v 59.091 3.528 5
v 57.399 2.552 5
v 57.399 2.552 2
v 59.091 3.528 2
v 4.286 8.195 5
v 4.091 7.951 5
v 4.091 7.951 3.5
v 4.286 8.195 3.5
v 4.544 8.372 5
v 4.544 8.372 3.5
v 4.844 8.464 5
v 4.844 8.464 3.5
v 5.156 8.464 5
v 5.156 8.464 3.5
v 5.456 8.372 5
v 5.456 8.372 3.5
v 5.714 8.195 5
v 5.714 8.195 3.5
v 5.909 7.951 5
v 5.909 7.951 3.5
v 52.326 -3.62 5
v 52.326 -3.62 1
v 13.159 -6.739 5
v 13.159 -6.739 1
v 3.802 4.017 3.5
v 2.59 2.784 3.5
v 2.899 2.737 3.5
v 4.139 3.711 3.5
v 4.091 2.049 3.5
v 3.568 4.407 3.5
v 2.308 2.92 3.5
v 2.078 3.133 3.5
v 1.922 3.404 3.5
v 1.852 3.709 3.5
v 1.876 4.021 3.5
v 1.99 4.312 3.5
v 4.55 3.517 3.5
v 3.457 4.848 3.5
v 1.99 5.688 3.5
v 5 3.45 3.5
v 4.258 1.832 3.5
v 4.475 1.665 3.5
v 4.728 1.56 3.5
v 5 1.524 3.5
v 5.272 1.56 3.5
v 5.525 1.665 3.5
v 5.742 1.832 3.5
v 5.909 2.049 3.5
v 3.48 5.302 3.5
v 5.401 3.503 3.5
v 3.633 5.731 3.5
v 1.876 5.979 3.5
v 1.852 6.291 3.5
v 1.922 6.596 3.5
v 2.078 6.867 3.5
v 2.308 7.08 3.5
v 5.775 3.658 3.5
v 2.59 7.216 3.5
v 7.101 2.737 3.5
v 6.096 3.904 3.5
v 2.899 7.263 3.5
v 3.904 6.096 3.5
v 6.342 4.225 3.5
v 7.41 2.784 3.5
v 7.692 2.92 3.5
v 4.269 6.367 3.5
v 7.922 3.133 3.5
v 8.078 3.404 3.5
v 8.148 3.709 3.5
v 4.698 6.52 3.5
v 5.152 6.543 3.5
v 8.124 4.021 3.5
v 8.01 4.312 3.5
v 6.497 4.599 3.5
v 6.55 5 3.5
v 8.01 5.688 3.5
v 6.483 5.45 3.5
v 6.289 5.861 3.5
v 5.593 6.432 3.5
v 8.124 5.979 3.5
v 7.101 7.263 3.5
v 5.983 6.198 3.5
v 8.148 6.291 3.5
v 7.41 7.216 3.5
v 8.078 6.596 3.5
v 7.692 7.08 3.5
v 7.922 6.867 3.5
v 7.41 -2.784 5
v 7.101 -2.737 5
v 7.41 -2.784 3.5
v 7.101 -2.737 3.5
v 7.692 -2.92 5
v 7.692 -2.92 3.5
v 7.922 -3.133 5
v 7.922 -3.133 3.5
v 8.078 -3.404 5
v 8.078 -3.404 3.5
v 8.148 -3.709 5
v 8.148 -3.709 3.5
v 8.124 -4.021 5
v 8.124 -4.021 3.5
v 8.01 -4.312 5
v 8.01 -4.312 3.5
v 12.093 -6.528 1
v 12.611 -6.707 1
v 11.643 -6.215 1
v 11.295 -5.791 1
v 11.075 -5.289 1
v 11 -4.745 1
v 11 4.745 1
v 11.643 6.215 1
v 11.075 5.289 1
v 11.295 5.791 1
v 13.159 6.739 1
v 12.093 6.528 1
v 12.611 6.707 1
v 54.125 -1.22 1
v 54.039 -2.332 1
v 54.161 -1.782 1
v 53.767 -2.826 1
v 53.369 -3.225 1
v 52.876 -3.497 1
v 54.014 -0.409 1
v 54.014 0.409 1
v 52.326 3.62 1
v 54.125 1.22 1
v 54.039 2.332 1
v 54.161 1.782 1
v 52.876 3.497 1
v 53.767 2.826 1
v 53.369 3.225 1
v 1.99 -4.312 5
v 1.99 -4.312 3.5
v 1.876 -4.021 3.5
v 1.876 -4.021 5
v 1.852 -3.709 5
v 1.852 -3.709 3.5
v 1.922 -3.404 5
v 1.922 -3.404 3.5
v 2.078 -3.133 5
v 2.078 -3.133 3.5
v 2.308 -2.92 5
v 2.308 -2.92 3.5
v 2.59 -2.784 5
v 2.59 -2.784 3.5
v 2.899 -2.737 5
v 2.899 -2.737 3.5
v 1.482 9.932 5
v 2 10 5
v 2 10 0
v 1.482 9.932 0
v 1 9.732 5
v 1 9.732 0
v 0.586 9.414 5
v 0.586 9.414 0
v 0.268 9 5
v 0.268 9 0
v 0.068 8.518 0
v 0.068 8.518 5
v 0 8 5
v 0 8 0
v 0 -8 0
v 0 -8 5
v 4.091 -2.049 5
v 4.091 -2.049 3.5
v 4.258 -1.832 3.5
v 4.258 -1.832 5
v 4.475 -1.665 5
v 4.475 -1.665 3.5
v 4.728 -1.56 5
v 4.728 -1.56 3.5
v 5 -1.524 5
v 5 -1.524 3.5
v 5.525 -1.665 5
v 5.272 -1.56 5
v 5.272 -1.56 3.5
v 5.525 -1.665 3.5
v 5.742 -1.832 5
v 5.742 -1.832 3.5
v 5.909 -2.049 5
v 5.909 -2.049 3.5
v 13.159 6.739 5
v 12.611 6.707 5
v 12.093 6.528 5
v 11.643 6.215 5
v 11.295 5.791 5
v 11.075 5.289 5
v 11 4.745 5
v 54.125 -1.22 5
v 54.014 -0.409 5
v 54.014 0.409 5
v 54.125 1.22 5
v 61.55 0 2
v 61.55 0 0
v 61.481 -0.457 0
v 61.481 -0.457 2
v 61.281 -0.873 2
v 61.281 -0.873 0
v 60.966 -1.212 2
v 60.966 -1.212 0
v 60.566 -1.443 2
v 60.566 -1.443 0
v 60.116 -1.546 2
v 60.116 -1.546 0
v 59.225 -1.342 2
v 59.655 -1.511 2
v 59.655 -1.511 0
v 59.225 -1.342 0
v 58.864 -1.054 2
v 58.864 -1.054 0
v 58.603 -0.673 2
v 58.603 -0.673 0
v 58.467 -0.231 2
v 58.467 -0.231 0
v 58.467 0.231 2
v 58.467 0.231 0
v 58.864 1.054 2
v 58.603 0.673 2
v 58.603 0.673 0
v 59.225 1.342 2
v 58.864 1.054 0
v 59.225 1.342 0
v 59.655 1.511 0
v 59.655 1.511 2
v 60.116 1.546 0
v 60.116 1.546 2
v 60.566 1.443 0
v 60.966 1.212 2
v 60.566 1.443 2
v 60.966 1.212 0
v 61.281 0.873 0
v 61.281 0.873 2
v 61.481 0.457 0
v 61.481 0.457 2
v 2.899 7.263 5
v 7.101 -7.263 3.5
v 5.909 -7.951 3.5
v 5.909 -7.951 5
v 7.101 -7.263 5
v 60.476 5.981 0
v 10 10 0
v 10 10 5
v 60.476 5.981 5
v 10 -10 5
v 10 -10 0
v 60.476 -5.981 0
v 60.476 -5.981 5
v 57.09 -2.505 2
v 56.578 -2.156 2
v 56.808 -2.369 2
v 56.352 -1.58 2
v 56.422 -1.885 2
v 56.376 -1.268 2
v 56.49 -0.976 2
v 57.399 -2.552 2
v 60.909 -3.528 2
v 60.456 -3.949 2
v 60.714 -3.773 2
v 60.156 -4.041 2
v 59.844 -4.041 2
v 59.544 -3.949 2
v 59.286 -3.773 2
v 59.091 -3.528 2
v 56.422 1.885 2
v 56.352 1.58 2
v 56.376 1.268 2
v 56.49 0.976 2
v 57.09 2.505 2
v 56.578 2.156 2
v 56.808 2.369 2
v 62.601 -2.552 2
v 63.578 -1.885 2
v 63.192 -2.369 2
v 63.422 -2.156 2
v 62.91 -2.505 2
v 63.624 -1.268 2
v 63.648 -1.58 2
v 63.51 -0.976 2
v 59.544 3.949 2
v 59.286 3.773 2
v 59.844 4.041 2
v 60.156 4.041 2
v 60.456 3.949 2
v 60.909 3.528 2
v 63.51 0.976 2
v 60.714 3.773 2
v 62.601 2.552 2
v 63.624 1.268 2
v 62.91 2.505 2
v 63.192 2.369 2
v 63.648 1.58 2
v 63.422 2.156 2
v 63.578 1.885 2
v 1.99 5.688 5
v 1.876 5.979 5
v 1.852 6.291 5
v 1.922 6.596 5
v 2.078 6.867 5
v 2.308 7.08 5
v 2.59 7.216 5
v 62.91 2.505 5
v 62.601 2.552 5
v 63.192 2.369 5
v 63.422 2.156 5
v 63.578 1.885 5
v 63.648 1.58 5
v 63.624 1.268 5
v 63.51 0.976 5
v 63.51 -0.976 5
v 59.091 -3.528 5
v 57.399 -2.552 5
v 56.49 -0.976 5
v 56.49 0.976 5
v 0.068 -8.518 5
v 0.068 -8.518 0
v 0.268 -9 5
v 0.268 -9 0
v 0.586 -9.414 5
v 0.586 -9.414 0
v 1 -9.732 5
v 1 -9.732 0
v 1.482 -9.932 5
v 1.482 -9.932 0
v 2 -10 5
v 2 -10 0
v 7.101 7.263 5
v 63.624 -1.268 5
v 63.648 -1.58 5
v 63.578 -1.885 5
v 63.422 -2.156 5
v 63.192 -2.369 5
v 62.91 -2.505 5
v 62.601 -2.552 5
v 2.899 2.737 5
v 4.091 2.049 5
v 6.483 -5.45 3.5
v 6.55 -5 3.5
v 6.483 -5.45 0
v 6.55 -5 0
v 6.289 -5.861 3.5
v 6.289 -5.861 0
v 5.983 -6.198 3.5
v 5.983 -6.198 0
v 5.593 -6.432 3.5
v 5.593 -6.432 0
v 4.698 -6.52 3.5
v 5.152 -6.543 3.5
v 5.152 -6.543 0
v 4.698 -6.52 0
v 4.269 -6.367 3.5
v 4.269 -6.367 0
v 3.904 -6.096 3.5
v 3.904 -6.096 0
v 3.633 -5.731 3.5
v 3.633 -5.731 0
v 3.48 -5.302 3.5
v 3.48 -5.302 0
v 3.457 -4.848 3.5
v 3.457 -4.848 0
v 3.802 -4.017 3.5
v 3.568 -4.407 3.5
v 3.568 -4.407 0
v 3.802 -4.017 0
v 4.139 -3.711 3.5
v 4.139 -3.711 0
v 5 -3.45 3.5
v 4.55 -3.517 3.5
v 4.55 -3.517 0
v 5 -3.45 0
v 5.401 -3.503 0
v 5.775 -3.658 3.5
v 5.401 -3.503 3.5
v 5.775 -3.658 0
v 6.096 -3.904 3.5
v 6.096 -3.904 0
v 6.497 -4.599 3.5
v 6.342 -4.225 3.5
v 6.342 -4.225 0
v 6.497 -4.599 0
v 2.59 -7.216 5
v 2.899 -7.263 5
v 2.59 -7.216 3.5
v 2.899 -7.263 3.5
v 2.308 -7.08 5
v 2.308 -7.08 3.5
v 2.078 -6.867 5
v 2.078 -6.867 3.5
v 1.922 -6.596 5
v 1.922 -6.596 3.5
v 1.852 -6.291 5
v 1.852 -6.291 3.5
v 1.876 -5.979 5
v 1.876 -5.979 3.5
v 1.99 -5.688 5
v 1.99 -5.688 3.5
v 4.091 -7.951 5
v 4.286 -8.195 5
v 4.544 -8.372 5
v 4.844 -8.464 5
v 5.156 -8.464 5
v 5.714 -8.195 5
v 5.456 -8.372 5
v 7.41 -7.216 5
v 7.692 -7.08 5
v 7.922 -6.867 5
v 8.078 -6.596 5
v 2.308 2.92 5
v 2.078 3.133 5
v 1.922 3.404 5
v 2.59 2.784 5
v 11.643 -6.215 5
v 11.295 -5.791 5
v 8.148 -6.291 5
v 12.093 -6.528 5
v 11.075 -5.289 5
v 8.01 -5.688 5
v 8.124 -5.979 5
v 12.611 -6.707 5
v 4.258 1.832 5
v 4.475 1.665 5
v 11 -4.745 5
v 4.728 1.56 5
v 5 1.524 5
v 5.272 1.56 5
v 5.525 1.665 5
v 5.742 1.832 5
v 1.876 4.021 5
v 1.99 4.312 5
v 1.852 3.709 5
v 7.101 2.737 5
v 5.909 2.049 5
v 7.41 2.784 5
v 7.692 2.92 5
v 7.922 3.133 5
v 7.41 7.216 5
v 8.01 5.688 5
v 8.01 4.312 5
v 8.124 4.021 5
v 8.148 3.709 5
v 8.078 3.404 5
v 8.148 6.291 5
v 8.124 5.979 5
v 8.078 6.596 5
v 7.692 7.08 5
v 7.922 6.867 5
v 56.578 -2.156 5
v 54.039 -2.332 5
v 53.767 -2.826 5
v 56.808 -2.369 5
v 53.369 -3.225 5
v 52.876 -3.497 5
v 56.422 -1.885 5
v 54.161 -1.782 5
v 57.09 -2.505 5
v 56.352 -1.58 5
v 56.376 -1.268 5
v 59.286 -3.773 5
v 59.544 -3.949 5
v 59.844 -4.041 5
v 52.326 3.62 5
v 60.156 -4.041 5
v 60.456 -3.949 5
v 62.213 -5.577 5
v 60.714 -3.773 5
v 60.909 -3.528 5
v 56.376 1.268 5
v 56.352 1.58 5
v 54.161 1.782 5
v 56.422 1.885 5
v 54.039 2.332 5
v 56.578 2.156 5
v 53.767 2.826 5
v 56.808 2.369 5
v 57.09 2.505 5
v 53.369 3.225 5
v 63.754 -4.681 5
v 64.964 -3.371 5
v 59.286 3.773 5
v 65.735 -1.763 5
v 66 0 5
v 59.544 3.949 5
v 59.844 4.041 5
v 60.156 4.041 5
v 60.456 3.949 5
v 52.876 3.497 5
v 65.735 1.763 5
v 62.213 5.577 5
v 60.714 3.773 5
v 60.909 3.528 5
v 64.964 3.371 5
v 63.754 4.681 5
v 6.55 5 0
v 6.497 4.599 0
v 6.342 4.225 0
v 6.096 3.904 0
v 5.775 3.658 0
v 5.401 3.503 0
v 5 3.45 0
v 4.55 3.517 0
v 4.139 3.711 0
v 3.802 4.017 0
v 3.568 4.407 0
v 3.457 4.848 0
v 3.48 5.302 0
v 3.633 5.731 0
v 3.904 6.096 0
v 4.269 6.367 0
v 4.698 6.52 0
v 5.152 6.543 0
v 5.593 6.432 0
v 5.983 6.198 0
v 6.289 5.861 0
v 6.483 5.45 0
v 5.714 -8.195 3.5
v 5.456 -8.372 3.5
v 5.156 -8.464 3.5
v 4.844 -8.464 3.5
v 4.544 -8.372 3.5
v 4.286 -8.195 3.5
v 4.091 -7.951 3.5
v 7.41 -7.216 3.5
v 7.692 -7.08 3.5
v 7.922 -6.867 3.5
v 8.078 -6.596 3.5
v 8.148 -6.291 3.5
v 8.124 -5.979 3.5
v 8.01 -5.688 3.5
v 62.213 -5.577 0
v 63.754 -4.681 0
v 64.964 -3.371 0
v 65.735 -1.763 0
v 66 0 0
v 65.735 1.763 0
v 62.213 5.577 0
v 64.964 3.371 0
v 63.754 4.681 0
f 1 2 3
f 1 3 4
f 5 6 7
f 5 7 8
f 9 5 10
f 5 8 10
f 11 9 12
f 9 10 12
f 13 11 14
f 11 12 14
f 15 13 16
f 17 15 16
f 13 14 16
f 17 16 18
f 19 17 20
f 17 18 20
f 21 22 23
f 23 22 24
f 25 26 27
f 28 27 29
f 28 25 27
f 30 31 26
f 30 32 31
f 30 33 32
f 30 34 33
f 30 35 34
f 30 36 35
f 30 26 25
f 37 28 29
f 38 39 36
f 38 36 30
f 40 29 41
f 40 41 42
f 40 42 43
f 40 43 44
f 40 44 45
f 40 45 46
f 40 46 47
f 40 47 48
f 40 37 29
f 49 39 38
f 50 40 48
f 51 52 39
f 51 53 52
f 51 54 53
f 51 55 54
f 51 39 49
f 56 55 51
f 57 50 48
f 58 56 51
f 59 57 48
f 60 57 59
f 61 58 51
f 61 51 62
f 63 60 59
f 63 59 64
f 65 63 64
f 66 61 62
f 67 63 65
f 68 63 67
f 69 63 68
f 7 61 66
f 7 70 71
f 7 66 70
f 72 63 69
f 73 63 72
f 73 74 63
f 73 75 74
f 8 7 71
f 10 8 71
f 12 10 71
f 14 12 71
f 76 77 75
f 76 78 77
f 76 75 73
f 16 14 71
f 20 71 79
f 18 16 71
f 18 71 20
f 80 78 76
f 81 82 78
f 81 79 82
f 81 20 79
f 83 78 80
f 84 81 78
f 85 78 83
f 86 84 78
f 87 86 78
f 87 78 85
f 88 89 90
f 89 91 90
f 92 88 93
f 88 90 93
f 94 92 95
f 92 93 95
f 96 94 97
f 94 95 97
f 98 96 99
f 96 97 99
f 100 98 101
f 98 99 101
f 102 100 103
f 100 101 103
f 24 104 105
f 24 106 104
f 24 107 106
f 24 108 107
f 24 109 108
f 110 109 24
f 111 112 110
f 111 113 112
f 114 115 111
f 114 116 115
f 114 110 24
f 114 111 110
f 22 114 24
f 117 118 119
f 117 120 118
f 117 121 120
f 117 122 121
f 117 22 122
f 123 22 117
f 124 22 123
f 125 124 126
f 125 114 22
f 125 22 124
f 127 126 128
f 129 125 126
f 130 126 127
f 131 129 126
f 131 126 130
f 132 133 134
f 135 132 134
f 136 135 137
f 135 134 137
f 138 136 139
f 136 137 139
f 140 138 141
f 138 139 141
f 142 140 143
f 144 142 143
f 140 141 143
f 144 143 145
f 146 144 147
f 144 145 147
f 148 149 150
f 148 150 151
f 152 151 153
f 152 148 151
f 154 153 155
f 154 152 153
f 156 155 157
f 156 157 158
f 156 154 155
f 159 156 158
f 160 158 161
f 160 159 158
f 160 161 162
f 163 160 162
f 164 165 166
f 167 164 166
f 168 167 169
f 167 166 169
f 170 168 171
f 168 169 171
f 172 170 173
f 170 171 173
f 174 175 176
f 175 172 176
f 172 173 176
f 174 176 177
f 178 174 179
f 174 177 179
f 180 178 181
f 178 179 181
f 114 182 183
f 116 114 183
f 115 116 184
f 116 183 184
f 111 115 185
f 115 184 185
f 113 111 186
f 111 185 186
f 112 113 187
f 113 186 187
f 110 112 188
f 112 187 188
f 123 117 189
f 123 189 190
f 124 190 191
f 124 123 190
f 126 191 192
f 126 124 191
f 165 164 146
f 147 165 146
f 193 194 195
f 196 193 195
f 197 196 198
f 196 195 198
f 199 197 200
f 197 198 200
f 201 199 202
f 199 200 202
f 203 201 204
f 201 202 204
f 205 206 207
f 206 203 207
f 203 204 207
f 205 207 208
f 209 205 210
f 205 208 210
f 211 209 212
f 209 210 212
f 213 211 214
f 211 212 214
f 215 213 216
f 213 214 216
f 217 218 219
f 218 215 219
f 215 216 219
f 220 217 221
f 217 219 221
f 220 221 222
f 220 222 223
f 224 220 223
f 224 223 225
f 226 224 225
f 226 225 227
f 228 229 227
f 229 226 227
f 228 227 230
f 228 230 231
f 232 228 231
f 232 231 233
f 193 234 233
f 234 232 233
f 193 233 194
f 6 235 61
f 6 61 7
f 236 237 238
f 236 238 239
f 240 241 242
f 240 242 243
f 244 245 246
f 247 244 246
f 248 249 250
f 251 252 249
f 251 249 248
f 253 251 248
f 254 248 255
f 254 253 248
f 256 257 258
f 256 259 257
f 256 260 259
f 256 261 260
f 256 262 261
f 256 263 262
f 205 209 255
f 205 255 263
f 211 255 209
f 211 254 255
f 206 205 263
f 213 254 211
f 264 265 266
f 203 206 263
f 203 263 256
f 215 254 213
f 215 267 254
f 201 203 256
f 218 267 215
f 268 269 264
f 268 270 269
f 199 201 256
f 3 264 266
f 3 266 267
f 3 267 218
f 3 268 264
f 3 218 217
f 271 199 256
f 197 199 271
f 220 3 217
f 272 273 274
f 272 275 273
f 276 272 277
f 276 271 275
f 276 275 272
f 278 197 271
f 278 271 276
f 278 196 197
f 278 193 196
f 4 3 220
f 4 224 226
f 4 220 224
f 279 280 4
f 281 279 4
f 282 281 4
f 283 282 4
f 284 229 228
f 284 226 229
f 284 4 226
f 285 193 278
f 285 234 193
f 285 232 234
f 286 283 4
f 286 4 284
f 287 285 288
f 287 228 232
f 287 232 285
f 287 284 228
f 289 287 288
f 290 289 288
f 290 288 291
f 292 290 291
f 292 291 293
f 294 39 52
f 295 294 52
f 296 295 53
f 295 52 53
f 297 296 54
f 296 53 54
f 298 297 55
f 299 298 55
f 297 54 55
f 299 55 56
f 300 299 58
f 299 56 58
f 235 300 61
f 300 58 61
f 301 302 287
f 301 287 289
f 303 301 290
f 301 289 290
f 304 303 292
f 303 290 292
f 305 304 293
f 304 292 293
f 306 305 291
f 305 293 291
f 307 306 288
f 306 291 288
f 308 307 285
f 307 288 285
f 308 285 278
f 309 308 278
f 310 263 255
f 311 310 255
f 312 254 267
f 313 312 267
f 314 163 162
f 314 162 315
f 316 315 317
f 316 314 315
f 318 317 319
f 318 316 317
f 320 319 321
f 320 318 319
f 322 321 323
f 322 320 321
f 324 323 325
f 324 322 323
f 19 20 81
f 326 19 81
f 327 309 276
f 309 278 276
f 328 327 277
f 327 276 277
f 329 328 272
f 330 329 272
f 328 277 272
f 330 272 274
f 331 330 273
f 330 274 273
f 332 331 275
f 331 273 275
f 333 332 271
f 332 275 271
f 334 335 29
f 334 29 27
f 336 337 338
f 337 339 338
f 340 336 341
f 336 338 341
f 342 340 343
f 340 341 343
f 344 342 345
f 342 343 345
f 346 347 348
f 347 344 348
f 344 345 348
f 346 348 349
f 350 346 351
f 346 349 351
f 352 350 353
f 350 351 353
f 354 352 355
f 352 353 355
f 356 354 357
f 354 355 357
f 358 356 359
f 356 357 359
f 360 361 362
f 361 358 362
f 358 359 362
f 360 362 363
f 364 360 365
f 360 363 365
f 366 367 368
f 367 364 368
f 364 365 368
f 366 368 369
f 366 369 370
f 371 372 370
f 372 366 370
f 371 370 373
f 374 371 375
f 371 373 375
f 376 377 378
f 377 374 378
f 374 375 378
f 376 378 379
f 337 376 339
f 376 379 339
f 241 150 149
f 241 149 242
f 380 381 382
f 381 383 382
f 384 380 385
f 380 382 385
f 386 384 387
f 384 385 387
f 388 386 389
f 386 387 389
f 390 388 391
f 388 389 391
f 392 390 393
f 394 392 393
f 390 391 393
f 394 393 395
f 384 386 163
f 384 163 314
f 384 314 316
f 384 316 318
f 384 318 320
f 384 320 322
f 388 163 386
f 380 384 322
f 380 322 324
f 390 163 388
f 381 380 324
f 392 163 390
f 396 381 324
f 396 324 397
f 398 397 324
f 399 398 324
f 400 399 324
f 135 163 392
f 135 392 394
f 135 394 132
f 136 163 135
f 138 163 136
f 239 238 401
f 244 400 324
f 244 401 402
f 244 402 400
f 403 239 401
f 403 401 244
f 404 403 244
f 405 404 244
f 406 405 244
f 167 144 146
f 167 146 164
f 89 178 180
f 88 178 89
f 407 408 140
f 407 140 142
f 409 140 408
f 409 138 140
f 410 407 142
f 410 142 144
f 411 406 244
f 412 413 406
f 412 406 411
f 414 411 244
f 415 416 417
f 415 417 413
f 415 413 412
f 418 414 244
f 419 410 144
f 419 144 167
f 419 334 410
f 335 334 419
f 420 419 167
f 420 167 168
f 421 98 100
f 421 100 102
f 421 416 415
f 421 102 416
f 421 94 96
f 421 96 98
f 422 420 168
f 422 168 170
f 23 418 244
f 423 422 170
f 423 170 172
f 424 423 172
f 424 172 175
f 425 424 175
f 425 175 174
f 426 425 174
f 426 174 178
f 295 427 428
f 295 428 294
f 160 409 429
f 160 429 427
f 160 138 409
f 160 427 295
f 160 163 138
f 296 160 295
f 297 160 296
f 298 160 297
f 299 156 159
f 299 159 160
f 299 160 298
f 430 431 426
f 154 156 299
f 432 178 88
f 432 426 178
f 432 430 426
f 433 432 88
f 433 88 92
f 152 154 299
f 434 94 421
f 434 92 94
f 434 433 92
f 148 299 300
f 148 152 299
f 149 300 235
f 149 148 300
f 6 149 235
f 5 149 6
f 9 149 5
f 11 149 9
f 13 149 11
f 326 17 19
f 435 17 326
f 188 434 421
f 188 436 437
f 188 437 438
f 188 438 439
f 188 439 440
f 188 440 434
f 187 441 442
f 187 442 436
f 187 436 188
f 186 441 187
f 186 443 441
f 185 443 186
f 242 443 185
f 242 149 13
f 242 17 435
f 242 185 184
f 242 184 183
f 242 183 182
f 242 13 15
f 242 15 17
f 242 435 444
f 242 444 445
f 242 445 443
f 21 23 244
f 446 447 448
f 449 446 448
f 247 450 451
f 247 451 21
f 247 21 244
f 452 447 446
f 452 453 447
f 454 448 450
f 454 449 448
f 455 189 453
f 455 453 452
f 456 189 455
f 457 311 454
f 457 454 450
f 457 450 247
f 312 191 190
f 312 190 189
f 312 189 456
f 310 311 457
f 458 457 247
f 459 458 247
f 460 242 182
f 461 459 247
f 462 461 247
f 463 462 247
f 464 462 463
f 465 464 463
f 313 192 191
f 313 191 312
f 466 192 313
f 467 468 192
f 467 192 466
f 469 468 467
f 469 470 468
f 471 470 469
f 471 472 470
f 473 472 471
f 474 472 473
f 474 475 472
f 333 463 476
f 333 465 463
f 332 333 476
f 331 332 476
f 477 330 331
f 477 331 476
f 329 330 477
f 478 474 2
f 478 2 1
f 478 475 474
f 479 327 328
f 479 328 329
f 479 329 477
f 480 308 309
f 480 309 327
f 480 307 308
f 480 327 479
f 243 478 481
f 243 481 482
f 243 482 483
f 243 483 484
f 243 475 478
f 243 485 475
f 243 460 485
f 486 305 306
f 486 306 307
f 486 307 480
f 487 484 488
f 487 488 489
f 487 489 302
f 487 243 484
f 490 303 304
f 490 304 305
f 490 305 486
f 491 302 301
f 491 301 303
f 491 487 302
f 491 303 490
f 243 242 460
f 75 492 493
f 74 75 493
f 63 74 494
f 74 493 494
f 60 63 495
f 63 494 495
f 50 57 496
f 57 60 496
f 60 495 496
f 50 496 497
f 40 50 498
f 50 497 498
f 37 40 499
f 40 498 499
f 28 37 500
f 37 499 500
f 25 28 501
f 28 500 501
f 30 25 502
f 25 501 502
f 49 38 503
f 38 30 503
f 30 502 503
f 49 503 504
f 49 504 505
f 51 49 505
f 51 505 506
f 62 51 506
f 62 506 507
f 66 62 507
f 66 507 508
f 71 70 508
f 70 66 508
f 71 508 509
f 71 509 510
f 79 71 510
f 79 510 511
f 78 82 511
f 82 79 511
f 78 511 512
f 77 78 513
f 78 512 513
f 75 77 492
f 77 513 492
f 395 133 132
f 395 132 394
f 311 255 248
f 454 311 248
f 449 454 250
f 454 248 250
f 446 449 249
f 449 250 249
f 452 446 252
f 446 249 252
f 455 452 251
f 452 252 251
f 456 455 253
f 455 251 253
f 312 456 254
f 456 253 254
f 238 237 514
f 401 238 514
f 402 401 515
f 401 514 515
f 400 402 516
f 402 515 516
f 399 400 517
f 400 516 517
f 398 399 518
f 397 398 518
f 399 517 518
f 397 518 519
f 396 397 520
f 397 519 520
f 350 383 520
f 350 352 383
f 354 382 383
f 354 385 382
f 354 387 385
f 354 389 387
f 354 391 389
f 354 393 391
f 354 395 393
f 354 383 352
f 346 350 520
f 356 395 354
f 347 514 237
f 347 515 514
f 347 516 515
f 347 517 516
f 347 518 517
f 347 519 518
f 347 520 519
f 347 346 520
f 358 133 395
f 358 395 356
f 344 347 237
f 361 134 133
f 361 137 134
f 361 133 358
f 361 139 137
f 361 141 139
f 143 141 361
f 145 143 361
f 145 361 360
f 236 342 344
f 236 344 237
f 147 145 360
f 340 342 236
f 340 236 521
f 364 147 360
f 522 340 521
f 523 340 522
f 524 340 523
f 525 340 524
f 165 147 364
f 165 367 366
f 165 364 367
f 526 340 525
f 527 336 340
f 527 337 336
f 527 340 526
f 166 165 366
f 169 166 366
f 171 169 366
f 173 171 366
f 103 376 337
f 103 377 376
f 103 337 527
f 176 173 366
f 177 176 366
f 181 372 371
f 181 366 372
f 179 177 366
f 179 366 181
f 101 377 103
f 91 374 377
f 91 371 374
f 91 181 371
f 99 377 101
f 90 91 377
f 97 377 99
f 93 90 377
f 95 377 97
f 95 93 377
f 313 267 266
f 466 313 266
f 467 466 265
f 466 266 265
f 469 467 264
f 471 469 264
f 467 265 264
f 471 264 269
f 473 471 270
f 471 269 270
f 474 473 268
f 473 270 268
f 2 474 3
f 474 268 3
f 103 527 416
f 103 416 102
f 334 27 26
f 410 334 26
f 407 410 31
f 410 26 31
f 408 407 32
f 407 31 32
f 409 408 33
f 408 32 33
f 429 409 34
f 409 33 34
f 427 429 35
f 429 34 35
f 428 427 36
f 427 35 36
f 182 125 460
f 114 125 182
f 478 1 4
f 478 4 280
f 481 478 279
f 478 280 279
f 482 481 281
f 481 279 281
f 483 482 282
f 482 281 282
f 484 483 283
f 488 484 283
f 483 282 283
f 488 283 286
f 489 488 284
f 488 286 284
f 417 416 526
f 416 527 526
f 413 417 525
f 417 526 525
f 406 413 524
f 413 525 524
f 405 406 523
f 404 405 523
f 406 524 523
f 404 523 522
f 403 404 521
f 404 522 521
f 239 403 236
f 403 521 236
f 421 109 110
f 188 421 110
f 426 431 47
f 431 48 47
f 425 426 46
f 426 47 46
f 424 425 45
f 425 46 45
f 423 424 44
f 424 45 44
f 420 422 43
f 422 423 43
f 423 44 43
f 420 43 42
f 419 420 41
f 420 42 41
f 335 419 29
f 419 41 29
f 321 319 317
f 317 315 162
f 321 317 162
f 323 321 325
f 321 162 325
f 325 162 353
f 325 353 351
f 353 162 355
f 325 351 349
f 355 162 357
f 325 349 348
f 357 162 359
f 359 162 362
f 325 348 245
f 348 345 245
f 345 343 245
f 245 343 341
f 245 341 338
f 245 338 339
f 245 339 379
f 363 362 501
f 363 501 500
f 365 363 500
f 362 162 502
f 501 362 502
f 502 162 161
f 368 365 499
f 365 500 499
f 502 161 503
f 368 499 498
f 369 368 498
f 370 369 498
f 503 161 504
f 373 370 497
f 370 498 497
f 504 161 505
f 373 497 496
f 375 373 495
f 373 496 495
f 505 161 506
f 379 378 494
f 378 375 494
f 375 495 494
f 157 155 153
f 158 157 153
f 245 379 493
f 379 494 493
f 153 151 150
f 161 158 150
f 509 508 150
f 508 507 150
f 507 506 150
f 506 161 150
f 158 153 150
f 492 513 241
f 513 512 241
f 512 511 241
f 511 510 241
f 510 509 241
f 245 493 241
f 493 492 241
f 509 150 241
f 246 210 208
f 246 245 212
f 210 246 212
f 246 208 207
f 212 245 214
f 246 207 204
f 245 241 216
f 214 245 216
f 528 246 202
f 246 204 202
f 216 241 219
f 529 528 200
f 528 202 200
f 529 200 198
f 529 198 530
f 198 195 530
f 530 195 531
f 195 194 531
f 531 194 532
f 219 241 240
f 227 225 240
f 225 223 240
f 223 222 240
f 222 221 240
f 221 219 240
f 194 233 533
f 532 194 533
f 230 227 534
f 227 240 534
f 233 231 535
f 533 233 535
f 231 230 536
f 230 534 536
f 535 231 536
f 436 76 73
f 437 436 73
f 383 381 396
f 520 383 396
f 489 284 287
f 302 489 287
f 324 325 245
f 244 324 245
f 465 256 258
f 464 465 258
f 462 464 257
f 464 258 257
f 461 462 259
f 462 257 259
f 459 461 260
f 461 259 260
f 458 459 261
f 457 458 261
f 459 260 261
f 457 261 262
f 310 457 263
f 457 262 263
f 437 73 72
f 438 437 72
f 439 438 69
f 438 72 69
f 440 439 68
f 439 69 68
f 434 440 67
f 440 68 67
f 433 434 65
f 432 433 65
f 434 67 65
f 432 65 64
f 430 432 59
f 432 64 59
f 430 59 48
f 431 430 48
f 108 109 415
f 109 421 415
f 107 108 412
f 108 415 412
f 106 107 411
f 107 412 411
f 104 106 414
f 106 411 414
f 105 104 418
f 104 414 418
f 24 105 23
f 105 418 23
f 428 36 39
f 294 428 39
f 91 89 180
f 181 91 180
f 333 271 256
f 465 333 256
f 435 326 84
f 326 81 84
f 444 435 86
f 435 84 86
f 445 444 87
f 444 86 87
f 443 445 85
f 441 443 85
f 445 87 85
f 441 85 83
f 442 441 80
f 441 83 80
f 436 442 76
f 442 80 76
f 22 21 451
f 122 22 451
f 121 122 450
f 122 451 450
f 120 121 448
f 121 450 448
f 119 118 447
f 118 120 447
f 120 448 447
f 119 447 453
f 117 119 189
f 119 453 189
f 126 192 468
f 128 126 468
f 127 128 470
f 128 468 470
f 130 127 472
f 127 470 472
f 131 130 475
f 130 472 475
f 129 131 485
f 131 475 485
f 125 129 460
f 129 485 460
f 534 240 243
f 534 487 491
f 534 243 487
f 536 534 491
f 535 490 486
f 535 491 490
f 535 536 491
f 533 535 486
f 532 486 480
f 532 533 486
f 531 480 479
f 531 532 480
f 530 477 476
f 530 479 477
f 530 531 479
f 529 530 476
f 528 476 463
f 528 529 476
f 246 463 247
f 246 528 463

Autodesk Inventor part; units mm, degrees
ref_plane "YZ Plane" through (0, 0, 0) normal (1, 0, 0) x (0, 1, 0)
ref_plane "XZ Plane" through (0, 0, 0) normal (0, 1, 0) x (-1, 0, 0)
ref_plane "XY Plane" through (0, 0, 0) normal (0, 0, 1) x (1, 0, 0)
sketch "スケッチ1" plane through (0, 0, 0) normal (0, 0, 1) x (1, 0, 0)
  circle A0 centre (5, 5) radius 1.55
  circle A1 centre (5, -5) radius 1.55
  line L0 (0, 0) -> (60, 0) construction
  circle A2 centre (60, 0) radius 1.55
  line L1 (0, 10) -> (0, -10)
  line L2 (0, -10) -> (10, -10)
  line L3 (10, -10) -> (60.4762, -5.9811)
  line L4 (10, 10) -> (60.4762, 5.9811)
  arc A3 (60.4762, -5.9811) -> (60.4762, 5.9811) centre (60, 0) ccw
  line L5 (55.0583, -3.4029) -> (11, -6.9109)
  line L6 (55.0583, 3.4029) -> (11, 6.9109)
  arc A4 (55.0583, 3.4029) -> (55.0583, -3.4029) centre (60, 0) ccw
  line L7 (11, -6.9109) -> (11, 6.9109)
  line L8 (5, -5) -> (5, 5)
  line L9 (0, 10) -> (10, 10)
  line L10 (8.01, 6.7378) -> (8.01, 3.2622)
  line L11 (8.01, 3.2622) -> (5, 1.5244)
  line L12 (5, 1.5244) -> (1.99, 3.2622)
  line L13 (1.99, 3.2622) -> (1.99, 6.7378)
  line L14 (1.99, 6.7378) -> (5, 8.4756)
  line L15 (5, 8.4756) -> (8.01, 6.7378)
  arc A5 (4.0907, 2.0494) -> (5.9093, 2.0494) centre (5, 2.5744) ccw
  arc A6 (7.1007, 2.7372) -> (8.01, 4.3122) centre (7.1007, 3.7872) ccw
  arc A7 (8.01, 5.6878) -> (7.1007, 7.2628) centre (7.1007, 6.2128) ccw
  arc A8 (5.9093, 7.9506) -> (4.0907, 7.9506) centre (5, 7.4256) ccw
  arc A9 (2.8993, 7.2628) -> (1.99, 5.6878) centre (2.8993, 6.2128) ccw
  arc A10 (1.99, 4.3122) -> (2.8993, 2.7372) centre (2.8993, 3.7872) ccw
  line L16 (8.01, -6.7378) -> (8.01, -3.2622)
  line L17 (8.01, -3.2622) -> (5, -1.5244)
  line L18 (5, -1.5244) -> (1.99, -3.2622)
  line L19 (1.99, -3.2622) -> (1.99, -6.7378)
  line L20 (1.99, -6.7378) -> (5, -8.4756)
  line L21 (5, -8.4756) -> (8.01, -6.7378)
  arc A11 (5.9093, -2.0494) -> (4.0907, -2.0494) centre (5, -2.5744) ccw
  arc A12 (8.01, -4.3122) -> (7.1007, -2.7372) centre (7.1007, -3.7872) ccw
  arc A13 (7.1007, -7.2628) -> (8.01, -5.6878) centre (7.1007, -6.2128) ccw
  arc A14 (4.0907, -7.9506) -> (5.9093, -7.9506) centre (5, -7.4256) ccw
  arc A15 (1.99, -5.6878) -> (2.8993, -7.2628) centre (2.8993, -6.2128) ccw
  arc A16 (2.8993, -2.7372) -> (1.99, -4.3122) centre (2.8993, -3.7872) ccw
  circle A17 centre (60, 0) radius 1.55
  line L22 (63.51, 2.0265) -> (63.51, -2.0265)
  line L23 (63.51, -2.0265) -> (60, -4.053)
  line L24 (60, -4.053) -> (56.49, -2.0265)
  line L25 (56.49, -2.0265) -> (56.49, 2.0265)
  line L26 (56.49, 2.0265) -> (60, 4.053)
  line L27 (60, 4.053) -> (63.51, 2.0265)
  arc A18 (59.0907, -3.528) -> (60.9093, -3.528) centre (60, -3.003) ccw
  arc A19 (62.6007, -2.5515) -> (63.51, -0.9765) centre (62.6007, -1.5015) ccw
  arc A20 (63.51, 0.9765) -> (62.6007, 2.5515) centre (62.6007, 1.5015) ccw
  arc A21 (60.9093, 3.528) -> (59.0907, 3.528) centre (60, 3.003) ccw
  arc A22 (57.3993, 2.5515) -> (56.49, 0.9765) centre (57.3993, 1.5015) ccw
  arc A23 (56.49, -0.9765) -> (57.3993, -2.5515) centre (57.3993, -1.5015) ccw
  line L28 (60, 4.053) -> (60, -4.053) construction
  point P0 (5, 0)
  point P1 (8.01, 3.2622)
  point P2 (8.01, 6.7378)
  point P3 (5, 8.4756)
  point P4 (1.99, 6.7378)
  point P5 (2.8993, 2.7372)
  point P6 (1.99, 4.3122)
  point P7 (1.99, 5.6878)
  point P8 (2.8993, 7.2628)
  point P9 (4.0907, 7.9506)
  point P10 (5.9093, 7.9506)
  point P11 (7.1007, 7.2628)
  point P12 (8.01, 5.6878)
  point P13 (8.01, 4.3122)
  point P14 (7.1007, 2.7372)
  point P15 (7.1007, -2.7372)
  point P16 (8.01, -4.3122)
  point P17 (8.01, -5.6878)
  point P18 (7.1007, -7.2628)
  point P19 (5.9093, -7.9506)
  point P20 (4.0907, -7.9506)
  point P21 (2.8993, -7.2628)
  point P22 (1.99, -5.6878)
  point P23 (1.99, -4.3122)
  point P24 (2.8993, -2.7372)
  point P25 (1.99, -6.7378)
  point P26 (5, -8.4756)
  point P27 (56.49, 2.0265)
  point P28 (56.49, -2.0265)
  point P29 (62.6007, -2.5515)
  point P30 (57.3993, -2.5515)
  point P31 (56.49, -0.9765)
  point P32 (56.49, 0.9765)
  point P33 (57.3993, 2.5515)
  point P34 (59.0907, 3.528)
  point P35 (60.9093, 3.528)
  point P36 (62.6007, 2.5515)
  point P37 (63.51, 0.9765)
  point P38 (63.51, -0.9765)
  dimension "d0" = 10
  dimension "d1" = 3.1
  dimension "d2" = 3.1
  dimension "d3" = 60
  dimension "d4" = 6
  dimension "d33" = 3
  dimension "d34" = 6
  dimension "d35" = 6
  dimension "d40" = 20
  dimension "d41" = 5
  dimension "d42" = 10
  dimension "d43" = 6.02
  dimension "d44" = 2.1
  dimension "d47" = 360
  dimension "d57" = 3.1
  dimension "d58" = 7.02
  dimension "d59" = 2.1
  dimension "d60" = 360
extrude "押し出し1" add sketch "スケッチ1" along normal blind 5 contours L9 L4 A3 L3 L2 L1
extrude "押し出し5" add sketch "スケッチ1" along normal blind 3.5 contours L12 L13 L14 L15 L10 L11 | L11 A5 | A11 L17 | L17 L16 L21 L20 L19 L18 | L18 A11 | A5 L12 | L11 A6 | A10 L12 | A12 L17 | L18 A16 | L10 A6 | A10 L13 | A12 L16 | L19 A16 | L10 A7 | A9 L13 | A13 L16 | L19 A15 | L15 A7 | A9 L14 | A13 L21 | L20 A15 | L15 A8 | A8 L14 | A14 L21 | L20 A14
extrude "押し出し6" add sketch "スケッチ1" along normal blind 2 contours A20 L22 | L22 L23 L24 L25 L26 L27 | L27 A20 | A19 L22 | L27 A21 | A19 L23 | L26 A21 | A18 L23 | L26 A22 | A18 L24 | L25 A22 | A23 L24 | L25 A23
extrude "押し出し7" add sketch "スケッチ1" along normal blind 1 contours L5 L7 L6 A4
fillet "フィレット2" radius 2 6 edges at (11, 6.9109, 3) (11, -6.9109, 3) (55.0583, 3.4029, 3) (55.0583, -3.4029, 3) (0, -10, 2.5) (0, 10, 2.5)
properties part number "Trunk_vertical_frame_05" material "アセタール樹脂、黒"
